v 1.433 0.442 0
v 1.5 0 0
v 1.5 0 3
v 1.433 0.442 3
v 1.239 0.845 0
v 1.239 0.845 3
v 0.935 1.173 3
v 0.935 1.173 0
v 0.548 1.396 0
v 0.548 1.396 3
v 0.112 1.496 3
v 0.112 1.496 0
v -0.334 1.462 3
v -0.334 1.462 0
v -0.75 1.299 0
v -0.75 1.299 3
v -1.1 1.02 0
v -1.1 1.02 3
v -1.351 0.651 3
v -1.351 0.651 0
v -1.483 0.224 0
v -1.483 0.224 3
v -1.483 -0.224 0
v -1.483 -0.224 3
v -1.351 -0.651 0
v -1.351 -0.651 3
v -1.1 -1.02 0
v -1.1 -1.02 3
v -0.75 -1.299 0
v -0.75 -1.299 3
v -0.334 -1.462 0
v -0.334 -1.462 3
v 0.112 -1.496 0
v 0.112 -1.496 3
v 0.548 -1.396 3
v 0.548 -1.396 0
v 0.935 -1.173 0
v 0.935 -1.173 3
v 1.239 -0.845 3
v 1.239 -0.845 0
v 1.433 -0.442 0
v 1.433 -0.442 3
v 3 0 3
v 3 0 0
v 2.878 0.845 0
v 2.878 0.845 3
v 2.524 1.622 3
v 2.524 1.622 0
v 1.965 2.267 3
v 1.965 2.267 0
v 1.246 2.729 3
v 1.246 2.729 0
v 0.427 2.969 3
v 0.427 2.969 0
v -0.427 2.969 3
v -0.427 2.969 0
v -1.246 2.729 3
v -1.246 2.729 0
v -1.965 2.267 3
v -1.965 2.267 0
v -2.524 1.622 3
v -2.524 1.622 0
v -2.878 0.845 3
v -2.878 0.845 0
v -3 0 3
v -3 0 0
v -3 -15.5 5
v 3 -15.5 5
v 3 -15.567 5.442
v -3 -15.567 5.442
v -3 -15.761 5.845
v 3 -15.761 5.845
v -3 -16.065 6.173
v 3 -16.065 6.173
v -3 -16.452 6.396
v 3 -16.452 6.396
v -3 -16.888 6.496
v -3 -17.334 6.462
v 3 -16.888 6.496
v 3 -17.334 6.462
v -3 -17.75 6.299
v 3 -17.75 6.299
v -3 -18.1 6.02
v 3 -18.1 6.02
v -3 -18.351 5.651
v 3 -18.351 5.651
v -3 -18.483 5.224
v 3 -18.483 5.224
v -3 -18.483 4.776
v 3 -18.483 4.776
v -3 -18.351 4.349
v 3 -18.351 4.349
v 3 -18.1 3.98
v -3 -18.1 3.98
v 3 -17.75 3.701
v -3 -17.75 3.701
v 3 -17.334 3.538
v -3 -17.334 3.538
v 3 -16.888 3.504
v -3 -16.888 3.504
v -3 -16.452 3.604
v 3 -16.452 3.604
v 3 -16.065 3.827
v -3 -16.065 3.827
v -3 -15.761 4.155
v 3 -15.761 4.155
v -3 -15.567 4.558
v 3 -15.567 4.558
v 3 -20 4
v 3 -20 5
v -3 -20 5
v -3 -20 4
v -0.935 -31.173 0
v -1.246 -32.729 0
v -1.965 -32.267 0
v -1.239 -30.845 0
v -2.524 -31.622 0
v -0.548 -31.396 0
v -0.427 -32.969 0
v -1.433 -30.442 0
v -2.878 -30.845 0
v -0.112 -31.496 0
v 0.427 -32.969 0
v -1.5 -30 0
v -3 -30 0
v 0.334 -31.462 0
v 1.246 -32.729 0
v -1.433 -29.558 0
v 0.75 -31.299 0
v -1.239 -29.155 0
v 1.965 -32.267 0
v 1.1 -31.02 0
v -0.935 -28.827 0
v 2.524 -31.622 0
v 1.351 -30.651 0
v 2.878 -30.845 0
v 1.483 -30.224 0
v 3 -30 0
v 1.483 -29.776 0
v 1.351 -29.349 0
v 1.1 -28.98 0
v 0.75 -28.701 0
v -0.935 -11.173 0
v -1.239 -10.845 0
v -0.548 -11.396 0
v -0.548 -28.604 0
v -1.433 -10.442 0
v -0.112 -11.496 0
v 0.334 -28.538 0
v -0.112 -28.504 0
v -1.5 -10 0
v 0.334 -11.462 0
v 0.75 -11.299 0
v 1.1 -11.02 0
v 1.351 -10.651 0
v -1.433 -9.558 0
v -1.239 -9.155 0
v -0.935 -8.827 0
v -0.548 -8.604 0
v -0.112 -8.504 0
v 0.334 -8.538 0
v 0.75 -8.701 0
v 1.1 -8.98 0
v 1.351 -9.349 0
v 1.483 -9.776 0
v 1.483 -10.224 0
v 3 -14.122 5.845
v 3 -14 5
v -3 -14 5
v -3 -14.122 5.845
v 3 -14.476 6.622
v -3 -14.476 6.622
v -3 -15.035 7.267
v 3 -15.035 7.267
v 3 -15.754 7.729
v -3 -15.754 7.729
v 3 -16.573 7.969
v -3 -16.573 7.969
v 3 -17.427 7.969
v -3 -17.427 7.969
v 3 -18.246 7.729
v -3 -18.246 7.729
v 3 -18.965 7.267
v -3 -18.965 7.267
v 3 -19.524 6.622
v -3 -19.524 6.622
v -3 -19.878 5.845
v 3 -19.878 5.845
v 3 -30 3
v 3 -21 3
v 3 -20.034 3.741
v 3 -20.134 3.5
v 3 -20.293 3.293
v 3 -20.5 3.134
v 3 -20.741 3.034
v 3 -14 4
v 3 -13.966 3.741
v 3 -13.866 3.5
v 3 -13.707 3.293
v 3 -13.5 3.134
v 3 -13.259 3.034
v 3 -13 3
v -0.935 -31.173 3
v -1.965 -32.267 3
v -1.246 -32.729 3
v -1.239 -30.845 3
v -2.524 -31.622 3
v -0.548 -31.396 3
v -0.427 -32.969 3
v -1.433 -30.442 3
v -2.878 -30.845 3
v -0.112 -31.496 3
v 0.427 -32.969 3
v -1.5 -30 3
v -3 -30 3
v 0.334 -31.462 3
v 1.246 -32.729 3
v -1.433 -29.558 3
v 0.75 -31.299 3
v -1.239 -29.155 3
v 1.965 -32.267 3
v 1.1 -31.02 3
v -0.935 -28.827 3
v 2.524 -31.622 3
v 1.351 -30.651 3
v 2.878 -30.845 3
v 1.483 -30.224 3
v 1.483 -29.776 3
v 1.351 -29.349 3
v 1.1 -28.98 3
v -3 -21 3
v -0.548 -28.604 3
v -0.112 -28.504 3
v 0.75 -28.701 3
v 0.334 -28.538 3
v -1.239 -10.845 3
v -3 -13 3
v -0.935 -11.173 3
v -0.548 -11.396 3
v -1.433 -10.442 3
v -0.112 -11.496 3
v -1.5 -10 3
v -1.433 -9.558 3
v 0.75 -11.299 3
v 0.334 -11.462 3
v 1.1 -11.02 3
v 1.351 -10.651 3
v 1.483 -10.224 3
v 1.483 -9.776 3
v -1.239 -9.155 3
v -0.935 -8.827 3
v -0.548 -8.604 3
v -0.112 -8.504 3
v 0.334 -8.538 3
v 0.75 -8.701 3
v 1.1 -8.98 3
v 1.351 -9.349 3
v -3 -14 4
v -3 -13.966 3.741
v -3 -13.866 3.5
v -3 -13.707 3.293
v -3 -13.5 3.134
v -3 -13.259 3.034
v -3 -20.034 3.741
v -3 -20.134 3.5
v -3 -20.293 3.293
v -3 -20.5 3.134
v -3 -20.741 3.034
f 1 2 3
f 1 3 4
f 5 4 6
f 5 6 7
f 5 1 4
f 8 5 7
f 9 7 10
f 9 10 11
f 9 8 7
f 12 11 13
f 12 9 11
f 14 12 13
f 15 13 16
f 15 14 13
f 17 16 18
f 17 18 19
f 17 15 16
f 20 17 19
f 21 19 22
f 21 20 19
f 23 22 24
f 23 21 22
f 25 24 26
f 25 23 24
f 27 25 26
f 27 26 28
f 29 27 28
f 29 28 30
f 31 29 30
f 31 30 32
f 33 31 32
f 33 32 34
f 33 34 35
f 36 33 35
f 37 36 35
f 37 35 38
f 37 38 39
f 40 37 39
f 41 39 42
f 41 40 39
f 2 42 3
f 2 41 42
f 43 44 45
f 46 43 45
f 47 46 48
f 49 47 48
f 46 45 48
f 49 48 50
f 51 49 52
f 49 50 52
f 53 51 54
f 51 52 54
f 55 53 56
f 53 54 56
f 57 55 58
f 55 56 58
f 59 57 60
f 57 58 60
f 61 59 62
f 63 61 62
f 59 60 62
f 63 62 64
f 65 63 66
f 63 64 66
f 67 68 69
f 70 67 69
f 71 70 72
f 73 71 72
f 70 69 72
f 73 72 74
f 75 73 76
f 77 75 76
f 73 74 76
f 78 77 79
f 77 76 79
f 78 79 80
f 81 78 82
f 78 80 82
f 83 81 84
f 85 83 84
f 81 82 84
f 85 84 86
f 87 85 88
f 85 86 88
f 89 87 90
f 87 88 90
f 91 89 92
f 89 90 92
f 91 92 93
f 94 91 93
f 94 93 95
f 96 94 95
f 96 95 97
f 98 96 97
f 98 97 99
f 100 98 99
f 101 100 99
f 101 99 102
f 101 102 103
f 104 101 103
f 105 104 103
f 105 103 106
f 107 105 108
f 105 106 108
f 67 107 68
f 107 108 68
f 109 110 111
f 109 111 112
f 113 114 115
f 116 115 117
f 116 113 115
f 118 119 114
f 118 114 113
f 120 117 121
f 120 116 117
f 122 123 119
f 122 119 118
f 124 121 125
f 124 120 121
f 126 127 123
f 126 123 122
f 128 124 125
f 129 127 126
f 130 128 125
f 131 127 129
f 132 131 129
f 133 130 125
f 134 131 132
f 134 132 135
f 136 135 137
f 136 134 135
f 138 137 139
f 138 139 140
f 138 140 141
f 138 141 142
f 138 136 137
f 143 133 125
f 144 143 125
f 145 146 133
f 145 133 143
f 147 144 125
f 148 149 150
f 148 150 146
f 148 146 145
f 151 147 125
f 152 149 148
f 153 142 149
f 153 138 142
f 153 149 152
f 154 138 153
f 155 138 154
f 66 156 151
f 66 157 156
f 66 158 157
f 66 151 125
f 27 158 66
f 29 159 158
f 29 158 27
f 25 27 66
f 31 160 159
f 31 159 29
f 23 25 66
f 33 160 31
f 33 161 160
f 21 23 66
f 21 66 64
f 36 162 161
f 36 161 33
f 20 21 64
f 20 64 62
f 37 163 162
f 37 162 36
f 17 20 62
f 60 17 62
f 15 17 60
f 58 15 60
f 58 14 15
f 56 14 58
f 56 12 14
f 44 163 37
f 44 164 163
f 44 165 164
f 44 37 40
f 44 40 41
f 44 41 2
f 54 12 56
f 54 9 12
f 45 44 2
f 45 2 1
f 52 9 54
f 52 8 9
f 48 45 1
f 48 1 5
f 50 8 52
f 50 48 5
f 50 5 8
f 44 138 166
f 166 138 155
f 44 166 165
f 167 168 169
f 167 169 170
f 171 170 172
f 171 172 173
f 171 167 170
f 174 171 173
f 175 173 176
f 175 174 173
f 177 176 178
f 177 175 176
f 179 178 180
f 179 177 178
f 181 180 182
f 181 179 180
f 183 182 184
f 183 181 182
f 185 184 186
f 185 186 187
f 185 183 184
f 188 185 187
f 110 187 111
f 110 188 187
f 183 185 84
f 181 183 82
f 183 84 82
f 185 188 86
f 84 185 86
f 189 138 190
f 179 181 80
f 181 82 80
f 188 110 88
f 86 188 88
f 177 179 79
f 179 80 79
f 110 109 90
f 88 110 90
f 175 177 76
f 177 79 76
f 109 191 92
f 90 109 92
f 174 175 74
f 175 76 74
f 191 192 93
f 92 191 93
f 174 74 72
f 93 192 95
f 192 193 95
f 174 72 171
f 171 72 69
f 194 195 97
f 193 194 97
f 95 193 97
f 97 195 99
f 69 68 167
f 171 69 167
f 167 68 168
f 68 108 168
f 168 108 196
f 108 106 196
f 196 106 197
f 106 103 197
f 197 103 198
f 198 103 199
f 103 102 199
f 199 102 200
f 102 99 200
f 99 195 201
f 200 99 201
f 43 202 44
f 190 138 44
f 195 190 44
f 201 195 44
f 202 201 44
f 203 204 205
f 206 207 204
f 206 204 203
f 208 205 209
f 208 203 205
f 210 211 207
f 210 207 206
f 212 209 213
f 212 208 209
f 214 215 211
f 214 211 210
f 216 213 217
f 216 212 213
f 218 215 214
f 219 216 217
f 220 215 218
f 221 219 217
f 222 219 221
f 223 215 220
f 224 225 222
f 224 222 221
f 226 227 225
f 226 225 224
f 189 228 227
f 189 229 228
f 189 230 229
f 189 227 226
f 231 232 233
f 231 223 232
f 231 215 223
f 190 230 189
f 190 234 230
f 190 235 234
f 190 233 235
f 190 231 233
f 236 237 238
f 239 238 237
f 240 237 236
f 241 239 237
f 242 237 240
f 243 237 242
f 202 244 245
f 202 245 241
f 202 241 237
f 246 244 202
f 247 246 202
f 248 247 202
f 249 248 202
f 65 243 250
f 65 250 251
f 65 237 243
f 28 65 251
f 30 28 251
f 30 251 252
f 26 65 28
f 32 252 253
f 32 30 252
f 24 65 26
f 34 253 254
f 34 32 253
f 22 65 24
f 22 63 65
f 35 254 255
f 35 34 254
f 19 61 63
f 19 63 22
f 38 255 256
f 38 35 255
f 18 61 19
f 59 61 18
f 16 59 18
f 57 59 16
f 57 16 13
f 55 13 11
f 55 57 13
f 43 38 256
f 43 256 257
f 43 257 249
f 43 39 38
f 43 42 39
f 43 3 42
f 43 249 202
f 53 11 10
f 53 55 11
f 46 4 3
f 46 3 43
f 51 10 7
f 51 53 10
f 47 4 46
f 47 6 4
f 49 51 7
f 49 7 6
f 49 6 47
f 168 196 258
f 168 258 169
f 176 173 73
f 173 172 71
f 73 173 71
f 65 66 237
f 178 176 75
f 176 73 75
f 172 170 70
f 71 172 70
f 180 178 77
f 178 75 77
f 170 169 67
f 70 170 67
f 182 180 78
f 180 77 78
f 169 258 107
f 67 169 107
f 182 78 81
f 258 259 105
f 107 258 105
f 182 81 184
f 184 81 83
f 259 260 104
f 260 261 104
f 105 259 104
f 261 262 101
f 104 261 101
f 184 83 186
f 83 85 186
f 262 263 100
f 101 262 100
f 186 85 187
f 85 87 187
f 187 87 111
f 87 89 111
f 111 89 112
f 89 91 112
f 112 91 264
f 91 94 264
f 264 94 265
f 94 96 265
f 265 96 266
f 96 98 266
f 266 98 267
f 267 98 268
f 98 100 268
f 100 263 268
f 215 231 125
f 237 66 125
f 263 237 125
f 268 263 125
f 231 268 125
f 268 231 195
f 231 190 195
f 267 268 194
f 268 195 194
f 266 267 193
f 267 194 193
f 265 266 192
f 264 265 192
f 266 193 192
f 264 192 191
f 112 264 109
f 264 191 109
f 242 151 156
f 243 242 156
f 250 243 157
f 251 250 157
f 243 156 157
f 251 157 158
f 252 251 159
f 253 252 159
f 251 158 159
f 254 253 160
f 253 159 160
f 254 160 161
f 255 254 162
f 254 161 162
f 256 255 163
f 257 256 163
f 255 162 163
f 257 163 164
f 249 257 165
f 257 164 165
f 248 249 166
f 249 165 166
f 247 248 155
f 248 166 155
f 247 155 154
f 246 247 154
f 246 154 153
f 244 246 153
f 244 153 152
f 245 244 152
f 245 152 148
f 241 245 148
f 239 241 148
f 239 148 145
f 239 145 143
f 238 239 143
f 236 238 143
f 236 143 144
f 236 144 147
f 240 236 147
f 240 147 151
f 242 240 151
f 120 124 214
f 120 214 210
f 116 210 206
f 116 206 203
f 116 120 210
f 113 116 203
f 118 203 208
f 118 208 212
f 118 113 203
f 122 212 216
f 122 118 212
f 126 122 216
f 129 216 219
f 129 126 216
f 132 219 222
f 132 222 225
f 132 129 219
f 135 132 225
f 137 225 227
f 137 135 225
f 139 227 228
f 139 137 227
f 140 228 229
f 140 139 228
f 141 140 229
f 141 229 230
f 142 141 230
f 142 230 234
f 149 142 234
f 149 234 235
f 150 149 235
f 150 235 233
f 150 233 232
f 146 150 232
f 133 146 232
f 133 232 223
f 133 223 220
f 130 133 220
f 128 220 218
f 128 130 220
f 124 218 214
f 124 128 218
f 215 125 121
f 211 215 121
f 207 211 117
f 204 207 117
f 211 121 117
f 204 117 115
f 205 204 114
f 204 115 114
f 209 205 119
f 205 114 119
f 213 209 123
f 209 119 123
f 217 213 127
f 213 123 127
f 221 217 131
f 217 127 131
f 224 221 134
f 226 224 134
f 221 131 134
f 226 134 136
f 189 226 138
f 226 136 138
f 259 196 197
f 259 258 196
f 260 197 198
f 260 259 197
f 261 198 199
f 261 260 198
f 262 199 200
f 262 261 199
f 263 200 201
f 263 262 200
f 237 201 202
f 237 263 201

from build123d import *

# Parameters (mm, degrees)
SKETCH_1_R          = 1.5
EXTRUDE_1_DEPTH     = 3
SKETCH_2_R          = 1.5
EXTRUDE_4_DEPTH     = 6
FILLET_1_R          = 1
SKETCH_3_R          = 1.5
CUT_EXTRUDE_1_DEPTH = 10


with BuildPart() as part:
    # ｽｹｯﾁ1 → ﾎﾞｽ - 押し出し1 (new body)
    with BuildSketch(Plane.XY):
        with BuildLine():
            Line((-3, 0), (-3, -30))
            ThreePointArc((-3, -30), (0, -33), (3, -30))
            Line((3, -30), (3, 0))
            ThreePointArc((3, 0), (0, 3), (-3, 0))
        make_face()
        Circle(SKETCH_1_R, mode=Mode.SUBTRACT)
        with Locations(Location((0, -30, 0), (0, 0, 180))):
            Circle(SKETCH_1_R, mode=Mode.SUBTRACT)
    extrude(amount=EXTRUDE_1_DEPTH)

    # ｽｹｯﾁ2 → ﾎﾞｽ - 押し出し4 (add)
    with BuildSketch(Plane(origin=(3, 0, 0), x_dir=(0, 0, -1), z_dir=(1, 0, 0))):
        with BuildLine():
            Line((0, -14), (-5, -14))
            ThreePointArc((-5, -14), (-8, -17), (-5, -20))
            Line((-5, -20), (0, -20))
            Line((0, -20), (0, -14))
        make_face()
        with Locations(Location((-5, -17, 0), (0, 0, 90))):
            Circle(SKETCH_2_R, mode=Mode.SUBTRACT)
    extrude(amount=-EXTRUDE_4_DEPTH)

    # ﾌｨﾚｯﾄ1
    fillet_1_edges = [part.edges().sort_by_distance(p)[0] for p in [
        (0, -14, 3),
        (0, -20, 3),
    ]]
    fillet(fillet_1_edges, radius=FILLET_1_R)

    # ｽｹｯﾁ3 → ｶｯﾄ - 押し出し1 (cut)
    with BuildSketch(Plane(origin=(0, 0, 0), x_dir=(-1, 0, 0), z_dir=(0, 0, -1))):
        with Locations((0, -10)):
            Circle(SKETCH_3_R)
    extrude(amount=-CUT_EXTRUDE_1_DEPTH, mode=Mode.SUBTRACT)


solid = part.part
